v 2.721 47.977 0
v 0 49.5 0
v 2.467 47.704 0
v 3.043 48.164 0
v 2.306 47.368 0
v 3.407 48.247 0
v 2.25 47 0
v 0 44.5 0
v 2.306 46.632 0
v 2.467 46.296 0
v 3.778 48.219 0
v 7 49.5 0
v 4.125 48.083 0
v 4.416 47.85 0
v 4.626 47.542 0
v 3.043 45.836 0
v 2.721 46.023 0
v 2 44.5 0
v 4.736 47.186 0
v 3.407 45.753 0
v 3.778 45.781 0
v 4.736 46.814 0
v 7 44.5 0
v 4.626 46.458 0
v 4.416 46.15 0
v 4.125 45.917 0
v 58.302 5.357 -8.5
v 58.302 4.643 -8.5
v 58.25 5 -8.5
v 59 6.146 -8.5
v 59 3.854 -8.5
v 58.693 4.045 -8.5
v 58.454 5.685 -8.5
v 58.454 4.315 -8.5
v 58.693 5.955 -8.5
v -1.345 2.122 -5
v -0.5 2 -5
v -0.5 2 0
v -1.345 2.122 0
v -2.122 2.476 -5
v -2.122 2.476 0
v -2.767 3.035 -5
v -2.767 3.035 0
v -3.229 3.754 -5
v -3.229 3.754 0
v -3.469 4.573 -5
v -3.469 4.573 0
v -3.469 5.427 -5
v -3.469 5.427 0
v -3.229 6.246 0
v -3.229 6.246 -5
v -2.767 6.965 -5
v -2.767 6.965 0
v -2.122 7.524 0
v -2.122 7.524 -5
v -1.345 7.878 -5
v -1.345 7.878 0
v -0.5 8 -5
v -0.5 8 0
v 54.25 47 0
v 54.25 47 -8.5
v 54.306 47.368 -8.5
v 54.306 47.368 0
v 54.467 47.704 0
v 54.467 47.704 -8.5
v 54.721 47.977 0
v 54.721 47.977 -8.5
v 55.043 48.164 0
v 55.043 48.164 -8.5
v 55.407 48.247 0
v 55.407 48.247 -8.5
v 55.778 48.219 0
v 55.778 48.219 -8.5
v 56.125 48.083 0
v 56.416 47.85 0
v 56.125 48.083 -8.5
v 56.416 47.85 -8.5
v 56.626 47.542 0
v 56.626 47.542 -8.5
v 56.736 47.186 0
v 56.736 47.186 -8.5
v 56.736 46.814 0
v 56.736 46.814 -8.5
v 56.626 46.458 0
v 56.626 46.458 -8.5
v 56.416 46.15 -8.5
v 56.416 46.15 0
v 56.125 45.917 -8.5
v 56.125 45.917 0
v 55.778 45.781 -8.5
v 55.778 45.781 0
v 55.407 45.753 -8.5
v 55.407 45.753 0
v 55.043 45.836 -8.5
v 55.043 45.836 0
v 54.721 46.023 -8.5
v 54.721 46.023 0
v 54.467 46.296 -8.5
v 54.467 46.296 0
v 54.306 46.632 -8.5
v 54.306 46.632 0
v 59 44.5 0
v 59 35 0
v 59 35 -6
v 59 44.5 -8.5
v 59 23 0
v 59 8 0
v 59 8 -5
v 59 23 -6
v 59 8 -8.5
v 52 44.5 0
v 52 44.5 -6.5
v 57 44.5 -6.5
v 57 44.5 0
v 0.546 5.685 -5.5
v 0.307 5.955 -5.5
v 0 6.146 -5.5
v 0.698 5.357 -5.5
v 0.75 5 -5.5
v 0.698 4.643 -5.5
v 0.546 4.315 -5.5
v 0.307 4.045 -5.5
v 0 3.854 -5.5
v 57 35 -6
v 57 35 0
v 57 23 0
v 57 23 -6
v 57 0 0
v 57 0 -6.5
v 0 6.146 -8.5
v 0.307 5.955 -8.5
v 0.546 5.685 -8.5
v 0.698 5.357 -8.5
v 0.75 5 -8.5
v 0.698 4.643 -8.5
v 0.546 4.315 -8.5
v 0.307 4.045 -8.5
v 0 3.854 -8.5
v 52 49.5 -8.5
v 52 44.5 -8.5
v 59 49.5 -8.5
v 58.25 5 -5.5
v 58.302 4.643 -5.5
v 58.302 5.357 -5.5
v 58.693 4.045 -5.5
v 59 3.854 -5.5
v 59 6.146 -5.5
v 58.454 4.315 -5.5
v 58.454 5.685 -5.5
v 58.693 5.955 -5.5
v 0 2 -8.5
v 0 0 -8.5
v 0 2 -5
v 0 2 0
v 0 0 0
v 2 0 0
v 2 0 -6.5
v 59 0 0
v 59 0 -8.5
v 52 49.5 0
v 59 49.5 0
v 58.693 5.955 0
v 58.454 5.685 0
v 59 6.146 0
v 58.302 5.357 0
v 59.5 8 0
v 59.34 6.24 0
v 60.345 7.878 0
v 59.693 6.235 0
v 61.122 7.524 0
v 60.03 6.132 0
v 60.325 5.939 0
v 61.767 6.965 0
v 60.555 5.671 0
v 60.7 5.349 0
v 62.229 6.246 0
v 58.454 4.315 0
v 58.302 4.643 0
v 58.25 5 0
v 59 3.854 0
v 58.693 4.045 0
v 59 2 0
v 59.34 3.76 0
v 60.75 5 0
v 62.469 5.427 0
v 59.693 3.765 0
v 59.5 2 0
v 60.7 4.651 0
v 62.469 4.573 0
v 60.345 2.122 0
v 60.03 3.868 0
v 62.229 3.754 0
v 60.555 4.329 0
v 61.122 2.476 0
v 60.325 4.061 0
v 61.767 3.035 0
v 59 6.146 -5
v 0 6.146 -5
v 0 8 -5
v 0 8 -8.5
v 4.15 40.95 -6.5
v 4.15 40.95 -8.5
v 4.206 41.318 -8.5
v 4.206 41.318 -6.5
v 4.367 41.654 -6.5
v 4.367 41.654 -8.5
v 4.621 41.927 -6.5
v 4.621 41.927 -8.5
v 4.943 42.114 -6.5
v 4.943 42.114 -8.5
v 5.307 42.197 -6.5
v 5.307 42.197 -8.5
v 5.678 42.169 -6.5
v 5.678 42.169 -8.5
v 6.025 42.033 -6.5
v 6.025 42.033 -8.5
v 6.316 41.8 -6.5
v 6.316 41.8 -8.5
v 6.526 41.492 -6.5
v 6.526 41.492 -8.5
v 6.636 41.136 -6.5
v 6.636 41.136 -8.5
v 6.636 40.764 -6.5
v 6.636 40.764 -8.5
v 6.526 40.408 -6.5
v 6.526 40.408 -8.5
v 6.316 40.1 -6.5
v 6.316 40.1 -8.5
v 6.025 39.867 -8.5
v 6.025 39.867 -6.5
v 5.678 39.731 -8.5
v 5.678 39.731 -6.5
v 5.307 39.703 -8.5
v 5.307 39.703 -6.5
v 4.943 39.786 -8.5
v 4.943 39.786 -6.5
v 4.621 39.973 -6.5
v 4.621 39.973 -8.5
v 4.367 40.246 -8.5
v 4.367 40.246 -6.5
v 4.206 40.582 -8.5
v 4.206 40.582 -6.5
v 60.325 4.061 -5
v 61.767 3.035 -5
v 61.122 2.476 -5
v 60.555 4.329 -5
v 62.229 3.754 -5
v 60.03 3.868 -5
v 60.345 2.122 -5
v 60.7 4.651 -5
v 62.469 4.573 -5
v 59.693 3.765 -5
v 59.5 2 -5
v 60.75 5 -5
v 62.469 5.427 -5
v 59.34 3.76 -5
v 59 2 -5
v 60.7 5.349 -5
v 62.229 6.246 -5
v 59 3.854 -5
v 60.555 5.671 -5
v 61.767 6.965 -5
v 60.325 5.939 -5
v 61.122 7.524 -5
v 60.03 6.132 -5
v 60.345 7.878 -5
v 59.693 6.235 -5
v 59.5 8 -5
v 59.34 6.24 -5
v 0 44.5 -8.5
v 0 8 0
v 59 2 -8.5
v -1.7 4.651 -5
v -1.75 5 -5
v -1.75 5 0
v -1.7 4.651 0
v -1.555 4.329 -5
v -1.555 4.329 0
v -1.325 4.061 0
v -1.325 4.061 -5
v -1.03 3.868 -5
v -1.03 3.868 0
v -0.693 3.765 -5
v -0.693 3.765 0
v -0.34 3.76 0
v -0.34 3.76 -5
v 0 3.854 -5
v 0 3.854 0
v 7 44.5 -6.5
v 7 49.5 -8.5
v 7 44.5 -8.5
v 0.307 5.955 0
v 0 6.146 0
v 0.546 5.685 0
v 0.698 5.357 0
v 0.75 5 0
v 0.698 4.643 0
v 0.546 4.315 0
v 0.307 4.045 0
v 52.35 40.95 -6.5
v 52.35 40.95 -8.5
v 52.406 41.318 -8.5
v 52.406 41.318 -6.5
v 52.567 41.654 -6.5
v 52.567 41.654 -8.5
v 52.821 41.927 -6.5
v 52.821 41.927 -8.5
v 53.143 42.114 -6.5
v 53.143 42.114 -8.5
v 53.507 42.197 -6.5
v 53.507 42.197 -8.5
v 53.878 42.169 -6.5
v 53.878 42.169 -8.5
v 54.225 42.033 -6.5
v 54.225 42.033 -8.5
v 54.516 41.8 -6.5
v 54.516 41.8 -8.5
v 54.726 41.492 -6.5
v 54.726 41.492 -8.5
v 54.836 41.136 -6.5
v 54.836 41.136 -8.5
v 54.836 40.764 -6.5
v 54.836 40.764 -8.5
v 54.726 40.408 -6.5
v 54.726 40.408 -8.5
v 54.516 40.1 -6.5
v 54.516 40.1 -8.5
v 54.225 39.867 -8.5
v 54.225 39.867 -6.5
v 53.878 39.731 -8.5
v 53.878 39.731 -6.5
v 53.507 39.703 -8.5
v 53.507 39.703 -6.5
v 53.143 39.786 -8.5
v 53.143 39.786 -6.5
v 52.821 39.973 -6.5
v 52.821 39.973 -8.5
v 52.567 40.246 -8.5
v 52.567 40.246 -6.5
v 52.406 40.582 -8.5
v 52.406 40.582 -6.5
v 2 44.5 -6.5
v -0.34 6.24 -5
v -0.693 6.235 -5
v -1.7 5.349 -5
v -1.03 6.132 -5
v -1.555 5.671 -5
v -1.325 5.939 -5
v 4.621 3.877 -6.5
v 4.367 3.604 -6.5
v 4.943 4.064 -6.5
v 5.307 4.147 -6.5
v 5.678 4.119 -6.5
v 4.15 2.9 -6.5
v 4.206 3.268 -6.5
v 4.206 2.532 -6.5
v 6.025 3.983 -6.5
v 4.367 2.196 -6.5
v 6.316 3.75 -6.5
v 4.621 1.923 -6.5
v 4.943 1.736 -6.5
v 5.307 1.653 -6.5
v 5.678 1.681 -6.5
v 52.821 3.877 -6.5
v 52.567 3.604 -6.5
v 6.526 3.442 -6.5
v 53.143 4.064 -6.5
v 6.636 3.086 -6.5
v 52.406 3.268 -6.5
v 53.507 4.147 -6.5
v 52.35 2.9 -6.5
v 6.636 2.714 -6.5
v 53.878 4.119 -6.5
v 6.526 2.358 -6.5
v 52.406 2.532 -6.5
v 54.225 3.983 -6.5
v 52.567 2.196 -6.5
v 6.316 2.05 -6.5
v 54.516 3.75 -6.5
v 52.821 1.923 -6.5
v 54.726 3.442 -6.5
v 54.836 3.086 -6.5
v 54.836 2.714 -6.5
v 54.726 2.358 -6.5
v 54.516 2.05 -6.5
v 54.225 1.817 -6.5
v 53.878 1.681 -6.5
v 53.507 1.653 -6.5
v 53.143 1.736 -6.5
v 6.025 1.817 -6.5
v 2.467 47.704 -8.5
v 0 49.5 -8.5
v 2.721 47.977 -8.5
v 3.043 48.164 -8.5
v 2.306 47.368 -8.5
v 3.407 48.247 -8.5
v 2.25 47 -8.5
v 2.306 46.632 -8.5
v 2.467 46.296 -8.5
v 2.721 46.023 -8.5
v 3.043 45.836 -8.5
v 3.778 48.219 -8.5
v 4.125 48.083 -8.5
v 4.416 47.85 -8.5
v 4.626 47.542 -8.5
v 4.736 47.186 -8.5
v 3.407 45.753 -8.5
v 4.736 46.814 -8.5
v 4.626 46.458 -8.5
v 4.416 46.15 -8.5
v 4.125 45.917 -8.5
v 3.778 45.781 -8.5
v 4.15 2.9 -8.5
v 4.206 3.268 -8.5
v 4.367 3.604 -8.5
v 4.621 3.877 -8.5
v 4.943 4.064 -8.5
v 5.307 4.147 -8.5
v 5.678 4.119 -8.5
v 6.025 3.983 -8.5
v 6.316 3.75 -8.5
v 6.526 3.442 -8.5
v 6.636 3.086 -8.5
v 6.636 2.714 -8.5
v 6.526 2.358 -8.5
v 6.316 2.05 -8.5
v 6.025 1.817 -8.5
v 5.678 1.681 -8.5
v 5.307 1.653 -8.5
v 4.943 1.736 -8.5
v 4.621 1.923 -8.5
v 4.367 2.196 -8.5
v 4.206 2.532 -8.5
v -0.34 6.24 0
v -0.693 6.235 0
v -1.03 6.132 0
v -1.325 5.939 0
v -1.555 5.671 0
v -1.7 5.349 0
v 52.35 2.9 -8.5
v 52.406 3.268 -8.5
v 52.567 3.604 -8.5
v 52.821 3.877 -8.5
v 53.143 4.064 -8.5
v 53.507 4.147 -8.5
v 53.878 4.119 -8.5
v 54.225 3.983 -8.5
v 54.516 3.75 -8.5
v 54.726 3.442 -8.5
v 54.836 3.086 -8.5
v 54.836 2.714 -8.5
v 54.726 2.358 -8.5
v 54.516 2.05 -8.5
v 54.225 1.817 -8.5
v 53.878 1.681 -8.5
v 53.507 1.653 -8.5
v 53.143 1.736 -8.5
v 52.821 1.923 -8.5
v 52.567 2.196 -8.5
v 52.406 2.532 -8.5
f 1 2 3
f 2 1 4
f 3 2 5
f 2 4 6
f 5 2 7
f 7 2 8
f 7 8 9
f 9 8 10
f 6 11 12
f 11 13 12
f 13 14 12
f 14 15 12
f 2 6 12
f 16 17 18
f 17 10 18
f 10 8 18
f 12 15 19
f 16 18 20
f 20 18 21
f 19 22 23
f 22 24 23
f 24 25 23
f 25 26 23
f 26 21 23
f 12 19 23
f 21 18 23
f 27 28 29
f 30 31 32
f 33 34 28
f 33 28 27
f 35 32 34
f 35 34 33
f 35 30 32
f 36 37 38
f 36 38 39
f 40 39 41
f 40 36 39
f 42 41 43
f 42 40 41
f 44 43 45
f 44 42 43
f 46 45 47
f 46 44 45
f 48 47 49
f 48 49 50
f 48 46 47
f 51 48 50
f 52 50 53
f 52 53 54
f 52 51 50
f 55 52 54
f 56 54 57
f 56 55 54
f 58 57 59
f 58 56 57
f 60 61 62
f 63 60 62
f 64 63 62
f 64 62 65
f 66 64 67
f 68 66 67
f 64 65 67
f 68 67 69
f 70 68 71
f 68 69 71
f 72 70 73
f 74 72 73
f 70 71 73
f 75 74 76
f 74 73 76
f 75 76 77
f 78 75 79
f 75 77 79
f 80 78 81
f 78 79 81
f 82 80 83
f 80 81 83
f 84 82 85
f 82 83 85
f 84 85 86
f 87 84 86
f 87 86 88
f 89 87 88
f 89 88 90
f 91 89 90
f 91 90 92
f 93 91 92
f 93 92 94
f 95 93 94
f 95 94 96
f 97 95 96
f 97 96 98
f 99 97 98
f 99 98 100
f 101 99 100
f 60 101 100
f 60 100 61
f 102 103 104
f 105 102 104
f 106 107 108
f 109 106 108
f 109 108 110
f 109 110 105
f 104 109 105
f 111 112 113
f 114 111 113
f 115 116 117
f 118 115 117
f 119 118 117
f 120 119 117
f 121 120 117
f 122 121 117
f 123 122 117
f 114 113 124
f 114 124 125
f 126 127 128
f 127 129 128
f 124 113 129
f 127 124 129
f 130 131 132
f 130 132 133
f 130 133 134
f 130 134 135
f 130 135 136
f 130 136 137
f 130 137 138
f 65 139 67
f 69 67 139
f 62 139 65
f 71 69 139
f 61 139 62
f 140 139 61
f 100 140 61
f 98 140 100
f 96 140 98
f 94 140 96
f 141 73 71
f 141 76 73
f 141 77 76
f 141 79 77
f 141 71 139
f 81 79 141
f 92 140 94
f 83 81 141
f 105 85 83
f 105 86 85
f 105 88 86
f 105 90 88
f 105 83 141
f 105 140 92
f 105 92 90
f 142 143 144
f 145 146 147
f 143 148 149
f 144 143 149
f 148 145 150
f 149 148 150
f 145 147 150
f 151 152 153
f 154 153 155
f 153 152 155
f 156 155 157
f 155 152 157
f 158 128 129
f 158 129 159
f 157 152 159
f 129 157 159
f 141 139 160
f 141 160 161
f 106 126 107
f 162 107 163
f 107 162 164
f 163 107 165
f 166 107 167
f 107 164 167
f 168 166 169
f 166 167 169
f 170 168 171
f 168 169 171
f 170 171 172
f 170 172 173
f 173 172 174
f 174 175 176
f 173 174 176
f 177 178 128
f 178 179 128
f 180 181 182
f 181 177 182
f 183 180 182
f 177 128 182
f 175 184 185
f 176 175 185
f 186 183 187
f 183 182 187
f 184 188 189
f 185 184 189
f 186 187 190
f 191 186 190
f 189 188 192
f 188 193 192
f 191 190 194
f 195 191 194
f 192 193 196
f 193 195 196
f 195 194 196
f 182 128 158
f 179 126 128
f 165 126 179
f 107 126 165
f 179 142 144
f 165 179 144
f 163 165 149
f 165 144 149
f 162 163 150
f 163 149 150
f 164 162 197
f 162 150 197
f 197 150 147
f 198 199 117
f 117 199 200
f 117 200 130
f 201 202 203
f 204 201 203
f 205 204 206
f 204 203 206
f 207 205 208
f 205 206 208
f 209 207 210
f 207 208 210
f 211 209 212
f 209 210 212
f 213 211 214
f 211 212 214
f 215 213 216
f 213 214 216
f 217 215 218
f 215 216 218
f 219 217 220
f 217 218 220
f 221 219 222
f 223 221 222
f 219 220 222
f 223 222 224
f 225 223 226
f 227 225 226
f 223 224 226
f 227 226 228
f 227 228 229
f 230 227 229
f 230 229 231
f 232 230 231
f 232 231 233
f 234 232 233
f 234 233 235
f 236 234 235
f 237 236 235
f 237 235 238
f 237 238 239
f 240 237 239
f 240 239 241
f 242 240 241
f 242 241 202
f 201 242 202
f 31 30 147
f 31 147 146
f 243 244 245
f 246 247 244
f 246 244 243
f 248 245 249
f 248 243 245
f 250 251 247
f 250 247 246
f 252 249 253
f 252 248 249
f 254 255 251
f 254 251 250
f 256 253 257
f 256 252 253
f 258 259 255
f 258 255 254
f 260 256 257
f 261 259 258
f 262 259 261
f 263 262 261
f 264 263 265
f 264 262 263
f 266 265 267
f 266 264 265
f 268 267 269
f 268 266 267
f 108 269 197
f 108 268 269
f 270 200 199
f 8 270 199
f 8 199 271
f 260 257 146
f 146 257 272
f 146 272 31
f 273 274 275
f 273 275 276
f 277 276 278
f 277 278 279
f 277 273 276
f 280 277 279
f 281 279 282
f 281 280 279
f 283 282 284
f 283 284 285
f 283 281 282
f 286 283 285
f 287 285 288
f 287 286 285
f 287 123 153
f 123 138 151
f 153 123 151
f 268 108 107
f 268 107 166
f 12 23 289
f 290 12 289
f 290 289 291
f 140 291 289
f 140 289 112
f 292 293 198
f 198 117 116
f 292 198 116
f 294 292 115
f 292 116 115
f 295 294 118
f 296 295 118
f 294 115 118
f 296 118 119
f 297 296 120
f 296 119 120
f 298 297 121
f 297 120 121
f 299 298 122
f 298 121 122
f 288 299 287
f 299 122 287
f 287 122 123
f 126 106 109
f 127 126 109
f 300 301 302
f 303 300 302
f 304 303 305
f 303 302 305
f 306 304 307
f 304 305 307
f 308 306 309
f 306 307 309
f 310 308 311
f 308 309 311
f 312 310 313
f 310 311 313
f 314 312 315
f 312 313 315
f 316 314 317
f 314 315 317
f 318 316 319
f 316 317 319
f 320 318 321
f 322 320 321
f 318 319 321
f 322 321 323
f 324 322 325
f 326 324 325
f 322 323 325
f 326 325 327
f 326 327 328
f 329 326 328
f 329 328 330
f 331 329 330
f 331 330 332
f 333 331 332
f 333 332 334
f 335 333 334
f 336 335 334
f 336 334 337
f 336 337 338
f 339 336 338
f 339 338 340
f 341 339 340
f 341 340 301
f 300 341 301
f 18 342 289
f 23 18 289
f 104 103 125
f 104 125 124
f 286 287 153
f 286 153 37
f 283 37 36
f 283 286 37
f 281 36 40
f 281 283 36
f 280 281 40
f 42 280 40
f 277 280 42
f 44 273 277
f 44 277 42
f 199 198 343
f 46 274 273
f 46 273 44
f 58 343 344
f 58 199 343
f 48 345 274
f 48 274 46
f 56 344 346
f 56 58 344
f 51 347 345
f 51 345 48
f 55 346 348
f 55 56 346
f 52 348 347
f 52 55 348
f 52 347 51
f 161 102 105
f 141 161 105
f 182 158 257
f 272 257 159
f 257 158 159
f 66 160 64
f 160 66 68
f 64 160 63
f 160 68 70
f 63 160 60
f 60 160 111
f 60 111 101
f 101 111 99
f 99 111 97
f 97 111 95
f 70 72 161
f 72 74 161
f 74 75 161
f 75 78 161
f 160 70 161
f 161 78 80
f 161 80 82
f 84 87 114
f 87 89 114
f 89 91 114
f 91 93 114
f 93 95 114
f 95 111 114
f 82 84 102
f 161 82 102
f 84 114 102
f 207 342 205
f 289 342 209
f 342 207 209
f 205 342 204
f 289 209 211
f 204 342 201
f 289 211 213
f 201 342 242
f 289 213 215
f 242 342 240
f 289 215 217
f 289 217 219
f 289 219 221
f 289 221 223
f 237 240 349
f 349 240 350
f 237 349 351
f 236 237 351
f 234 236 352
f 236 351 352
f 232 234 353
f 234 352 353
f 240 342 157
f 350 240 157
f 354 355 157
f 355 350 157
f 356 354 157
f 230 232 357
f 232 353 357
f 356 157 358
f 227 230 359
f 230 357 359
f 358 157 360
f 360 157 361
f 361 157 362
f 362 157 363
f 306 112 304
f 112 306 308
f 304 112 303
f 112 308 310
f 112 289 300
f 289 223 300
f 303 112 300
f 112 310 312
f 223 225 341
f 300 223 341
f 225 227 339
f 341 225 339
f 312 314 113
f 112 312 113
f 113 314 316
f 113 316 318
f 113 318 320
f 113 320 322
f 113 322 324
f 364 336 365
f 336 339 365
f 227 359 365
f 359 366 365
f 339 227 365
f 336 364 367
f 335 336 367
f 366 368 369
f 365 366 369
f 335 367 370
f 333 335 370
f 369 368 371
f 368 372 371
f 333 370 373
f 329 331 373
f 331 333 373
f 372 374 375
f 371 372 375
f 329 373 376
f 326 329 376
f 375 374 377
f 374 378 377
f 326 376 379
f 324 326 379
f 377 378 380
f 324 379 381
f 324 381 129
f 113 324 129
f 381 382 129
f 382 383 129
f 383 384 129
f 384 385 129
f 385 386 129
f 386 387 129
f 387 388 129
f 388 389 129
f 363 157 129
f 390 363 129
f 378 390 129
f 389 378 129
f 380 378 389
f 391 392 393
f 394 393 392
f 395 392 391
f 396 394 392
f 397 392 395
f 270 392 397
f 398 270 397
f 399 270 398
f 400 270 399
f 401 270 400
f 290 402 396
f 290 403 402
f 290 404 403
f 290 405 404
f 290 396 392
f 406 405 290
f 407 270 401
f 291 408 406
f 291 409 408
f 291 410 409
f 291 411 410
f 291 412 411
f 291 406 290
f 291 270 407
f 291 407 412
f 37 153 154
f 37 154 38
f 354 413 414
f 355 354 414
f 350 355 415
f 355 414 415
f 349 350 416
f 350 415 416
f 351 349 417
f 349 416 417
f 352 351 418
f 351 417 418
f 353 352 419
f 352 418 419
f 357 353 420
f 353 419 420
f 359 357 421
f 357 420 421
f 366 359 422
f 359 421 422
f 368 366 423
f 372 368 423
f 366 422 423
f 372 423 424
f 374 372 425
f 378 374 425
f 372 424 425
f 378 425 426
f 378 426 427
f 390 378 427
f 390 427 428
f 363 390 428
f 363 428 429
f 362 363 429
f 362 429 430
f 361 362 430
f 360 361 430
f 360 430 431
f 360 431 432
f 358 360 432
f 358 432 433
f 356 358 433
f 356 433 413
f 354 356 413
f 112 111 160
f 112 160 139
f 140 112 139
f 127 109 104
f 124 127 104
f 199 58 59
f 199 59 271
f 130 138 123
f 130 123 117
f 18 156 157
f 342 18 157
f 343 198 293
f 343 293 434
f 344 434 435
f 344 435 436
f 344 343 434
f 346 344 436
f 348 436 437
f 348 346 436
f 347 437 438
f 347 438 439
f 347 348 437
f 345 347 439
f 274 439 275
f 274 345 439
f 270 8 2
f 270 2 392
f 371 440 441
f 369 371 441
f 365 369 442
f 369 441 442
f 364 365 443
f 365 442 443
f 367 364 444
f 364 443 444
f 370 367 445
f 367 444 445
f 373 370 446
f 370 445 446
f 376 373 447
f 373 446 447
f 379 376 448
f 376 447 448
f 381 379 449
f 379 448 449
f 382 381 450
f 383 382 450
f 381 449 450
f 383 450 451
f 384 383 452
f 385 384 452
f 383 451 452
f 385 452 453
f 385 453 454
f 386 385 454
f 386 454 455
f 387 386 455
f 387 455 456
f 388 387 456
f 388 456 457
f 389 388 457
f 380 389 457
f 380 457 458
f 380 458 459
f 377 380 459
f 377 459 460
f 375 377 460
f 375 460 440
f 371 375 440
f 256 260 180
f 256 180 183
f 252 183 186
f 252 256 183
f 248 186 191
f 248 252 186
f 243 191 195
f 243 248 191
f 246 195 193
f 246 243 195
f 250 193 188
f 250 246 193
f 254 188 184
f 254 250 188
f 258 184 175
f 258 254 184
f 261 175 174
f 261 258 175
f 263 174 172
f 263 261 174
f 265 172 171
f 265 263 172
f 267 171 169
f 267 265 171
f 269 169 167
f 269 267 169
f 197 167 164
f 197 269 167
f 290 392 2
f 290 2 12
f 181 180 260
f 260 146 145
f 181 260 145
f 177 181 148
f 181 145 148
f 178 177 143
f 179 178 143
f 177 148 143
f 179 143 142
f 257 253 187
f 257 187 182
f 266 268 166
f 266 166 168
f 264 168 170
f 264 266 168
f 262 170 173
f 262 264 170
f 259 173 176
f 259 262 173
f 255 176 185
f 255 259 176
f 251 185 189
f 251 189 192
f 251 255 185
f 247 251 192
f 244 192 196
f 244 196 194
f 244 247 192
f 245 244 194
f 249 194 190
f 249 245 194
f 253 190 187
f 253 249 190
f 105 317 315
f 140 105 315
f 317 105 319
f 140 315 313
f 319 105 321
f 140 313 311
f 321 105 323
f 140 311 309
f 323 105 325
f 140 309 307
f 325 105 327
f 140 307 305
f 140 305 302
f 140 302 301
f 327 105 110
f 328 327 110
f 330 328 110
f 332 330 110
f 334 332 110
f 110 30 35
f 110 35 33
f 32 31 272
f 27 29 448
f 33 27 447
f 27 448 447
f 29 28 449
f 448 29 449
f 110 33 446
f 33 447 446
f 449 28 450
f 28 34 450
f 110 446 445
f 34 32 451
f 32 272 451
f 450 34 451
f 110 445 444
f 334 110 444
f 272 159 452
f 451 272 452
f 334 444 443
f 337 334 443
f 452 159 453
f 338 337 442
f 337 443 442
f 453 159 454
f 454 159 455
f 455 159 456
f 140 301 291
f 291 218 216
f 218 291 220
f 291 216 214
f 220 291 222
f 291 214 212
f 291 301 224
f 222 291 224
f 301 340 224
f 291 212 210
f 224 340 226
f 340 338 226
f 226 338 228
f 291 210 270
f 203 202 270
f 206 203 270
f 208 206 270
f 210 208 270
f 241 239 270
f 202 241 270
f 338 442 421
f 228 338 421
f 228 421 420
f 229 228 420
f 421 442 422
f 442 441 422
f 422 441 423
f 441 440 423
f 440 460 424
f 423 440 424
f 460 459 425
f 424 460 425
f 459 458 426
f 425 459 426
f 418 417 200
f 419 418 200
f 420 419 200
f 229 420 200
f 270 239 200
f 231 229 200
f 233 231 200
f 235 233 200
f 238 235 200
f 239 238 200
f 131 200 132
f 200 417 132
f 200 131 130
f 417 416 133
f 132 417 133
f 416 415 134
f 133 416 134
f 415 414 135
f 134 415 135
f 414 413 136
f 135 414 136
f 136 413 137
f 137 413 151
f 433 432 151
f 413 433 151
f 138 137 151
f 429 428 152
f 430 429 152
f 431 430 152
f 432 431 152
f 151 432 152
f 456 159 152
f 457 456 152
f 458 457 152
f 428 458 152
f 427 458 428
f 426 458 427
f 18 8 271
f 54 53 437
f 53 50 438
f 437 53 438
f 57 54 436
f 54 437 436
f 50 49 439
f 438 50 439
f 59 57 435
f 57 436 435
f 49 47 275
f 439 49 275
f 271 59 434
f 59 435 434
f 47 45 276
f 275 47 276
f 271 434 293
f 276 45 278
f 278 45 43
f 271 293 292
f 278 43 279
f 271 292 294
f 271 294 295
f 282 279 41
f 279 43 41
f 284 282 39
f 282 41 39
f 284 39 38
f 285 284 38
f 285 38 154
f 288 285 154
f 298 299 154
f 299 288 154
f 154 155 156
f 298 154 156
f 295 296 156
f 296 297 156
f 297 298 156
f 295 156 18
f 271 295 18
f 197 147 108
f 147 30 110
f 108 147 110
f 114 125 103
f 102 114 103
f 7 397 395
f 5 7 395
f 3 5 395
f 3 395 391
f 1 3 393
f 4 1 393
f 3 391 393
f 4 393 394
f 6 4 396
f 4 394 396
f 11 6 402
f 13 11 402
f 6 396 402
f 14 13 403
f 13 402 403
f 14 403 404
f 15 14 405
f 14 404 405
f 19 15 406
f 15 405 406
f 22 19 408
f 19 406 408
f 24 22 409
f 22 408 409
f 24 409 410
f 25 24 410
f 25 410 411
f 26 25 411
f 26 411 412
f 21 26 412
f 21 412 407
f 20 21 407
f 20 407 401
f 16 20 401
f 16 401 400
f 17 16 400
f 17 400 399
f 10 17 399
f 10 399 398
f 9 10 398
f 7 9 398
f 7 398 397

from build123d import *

# Parameters (mm, degrees)
BOSS_EXTRUDE1_DEPTH = 44.5
SKETCH2_W           = 6
SKETCH2_H           = 12
CUT_EXTRUDE1_DEPTH  = 10
BOSS_EXTRUDE2_DEPTH = 8.5
CUT_EXTRUDE2_DEPTH  = 11
SKETCH4_W           = 7
SKETCH4_H           = 8.5
BOSS_EXTRUDE3_DEPTH = 5
SKETCH5_R           = 1.25
CUT_EXTRUDE3_DEPTH  = 81.179486155
SKETCH7_R           = 1.25
CUT_EXTRUDE4_DEPTH  = 10
CUT_EXTRUDE6_DEPTH  = 3.5
BOSS_EXTRUDE4_DEPTH = 3


with BuildPart() as part:
    # Sketch1 → Boss-Extrude1 (new body)
    with BuildSketch(Plane(origin=(0, 0, 0), x_dir=(1, 0, 0), z_dir=(0, 1, 0))):
        Polygon((0, 0), (2, 0), (2, 6.5), (57, 6.5), (57, 0), (59, 0), (59, 8.5), (0, 8.5), align=None)
    extrude(amount=BOSS_EXTRUDE1_DEPTH)

    # Sketch2 → Cut-Extrude1 (cut)
    with BuildSketch(Plane(origin=(59, 0, 0), x_dir=(0, 0, -1), z_dir=(1, 0, 0))):
        with Locations((3, 29)):
            Rectangle(SKETCH2_W, SKETCH2_H)
    extrude(amount=-CUT_EXTRUDE1_DEPTH, mode=Mode.SUBTRACT)

    # Sketch3 → Boss-Extrude2 (add)
    with BuildSketch(Plane(origin=(0, 0, -8.5), x_dir=(-1, 0, 0), z_dir=(0, 0, -1))):
        with BuildLine():
            Line((-59, 6.145643924), (-59, 8))
            Line((-59, 8), (-59.5, 8))
            ThreePointArc((-59.5, 8), (-62.5, 5), (-59.5, 2))
            Line((-59.5, 2), (-59, 2))
            Line((-59, 2), (-59, 3.854356076))
            ThreePointArc((-59, 3.854356076), (-60.75, 5), (-59, 6.145643924))
        make_face()
        with BuildLine():
            Line((0.5, 8), (0, 8))
            Line((0, 8), (0, 6.145643924))
            ThreePointArc((0, 6.145643924), (1.75, 5), (0, 3.854356076))
            Line((0, 3.854356076), (0, 2))
            Line((0, 2), (0.5, 2))
            ThreePointArc((0.5, 2), (3.5, 5), (0.5, 8))
        make_face()
    extrude(amount=-BOSS_EXTRUDE2_DEPTH)

    # Sketch3<3> → Cut-Extrude2 (cut)
    with BuildSketch(Plane(origin=(0, 0, -8.5), x_dir=(-1, 0, 0), z_dir=(0, 0, -1))):
        with BuildLine():
            ThreePointArc((-59, 3.854356076), (-58.25, 5), (-59, 6.145643924))
            Line((-59, 6.145643924), (-59, 3.854356076))
        make_face()
        with BuildLine():
            Line((0, 3.854356076), (0, 6.145643924))
            ThreePointArc((0, 6.145643924), (-0.75, 5), (0, 3.854356076))
        make_face()
    extrude(amount=-CUT_EXTRUDE2_DEPTH, mode=Mode.SUBTRACT)

    # Sketch4 → Boss-Extrude3 (add)
    with BuildSketch(Plane(origin=(0, 44.5, 0), x_dir=(1, 0, 0), z_dir=(0, 1, 0))):
        with Locations((3.5, 4.25)):
            Rectangle(SKETCH4_W, SKETCH4_H)
        with Locations((55.5, 4.25)):
            Rectangle(SKETCH4_W, SKETCH4_H)
    extrude(amount=BOSS_EXTRUDE3_DEPTH)

    # Sketch5 → Cut-Extrude3 (cut, through all)
    with BuildSketch(Plane(origin=(0, 0, -8.5), x_dir=(-1, 0, 0), z_dir=(0, 0, -1))):
        with Locations((-55.5, 47)):
            Circle(SKETCH5_R)
        with Locations((-3.5, 47)):
            Circle(SKETCH5_R)
    extrude(amount=-CUT_EXTRUDE3_DEPTH, mode=Mode.SUBTRACT)

    # Sketch7 → Cut-Extrude4 (cut)
    with BuildSketch(Plane(origin=(0, 0, -8.5), x_dir=(-1, 0, 0), z_dir=(0, 0, -1))):
        with Locations((-5.4, 2.9)):
            Circle(SKETCH7_R)
        with Locations((-53.6, 2.9)):
            Circle(SKETCH7_R)
        with Locations((-53.6, 40.95)):
            Circle(SKETCH7_R)
        with Locations((-5.4, 40.95)):
            Circle(SKETCH7_R)
    extrude(amount=-CUT_EXTRUDE4_DEPTH, mode=Mode.SUBTRACT)

    # Sketch3<4> → Cut-Extrude6 (cut)
    with BuildSketch(Plane(origin=(0, 0, -8.5), x_dir=(-1, 0, 0), z_dir=(0, 0, -1))):
        with BuildLine():
            Line((-59, 6.145643924), (-59, 8))
            Line((-59, 8), (-59.5, 8))
            ThreePointArc((-59.5, 8), (-62.5, 5), (-59.5, 2))
            Line((-59.5, 2), (-59, 2))
            Line((-59, 2), (-59, 3.854356076))
            ThreePointArc((-59, 3.854356076), (-60.75, 5), (-59, 6.145643924))
        make_face()
        with BuildLine():
            Line((0.5, 8), (0, 8))
            Line((0, 8), (0, 6.145643924))
            ThreePointArc((0, 6.145643924), (1.75, 5), (0, 3.854356076))
            Line((0, 3.854356076), (0, 2))
            Line((0, 2), (0.5, 2))
            ThreePointArc((0.5, 2), (3.5, 5), (0.5, 8))
        make_face()
    extrude(amount=-CUT_EXTRUDE6_DEPTH, mode=Mode.SUBTRACT)

    # Sketch3<5> → Boss-Extrude4 (add)
    with BuildSketch(Plane(origin=(0, 0, -8.5), x_dir=(-1, 0, 0), z_dir=(0, 0, -1))):
        with BuildLine():
            ThreePointArc((-59, 3.854356076), (-58.25, 5), (-59, 6.145643924))
            Line((-59, 6.145643924), (-59, 3.854356076))
        make_face()
        with BuildLine():
            Line((0, 3.854356076), (0, 6.145643924))
            ThreePointArc((0, 6.145643924), (-0.75, 5), (0, 3.854356076))
        make_face()
    extrude(amount=-BOSS_EXTRUDE4_DEPTH)


solid = part.part
